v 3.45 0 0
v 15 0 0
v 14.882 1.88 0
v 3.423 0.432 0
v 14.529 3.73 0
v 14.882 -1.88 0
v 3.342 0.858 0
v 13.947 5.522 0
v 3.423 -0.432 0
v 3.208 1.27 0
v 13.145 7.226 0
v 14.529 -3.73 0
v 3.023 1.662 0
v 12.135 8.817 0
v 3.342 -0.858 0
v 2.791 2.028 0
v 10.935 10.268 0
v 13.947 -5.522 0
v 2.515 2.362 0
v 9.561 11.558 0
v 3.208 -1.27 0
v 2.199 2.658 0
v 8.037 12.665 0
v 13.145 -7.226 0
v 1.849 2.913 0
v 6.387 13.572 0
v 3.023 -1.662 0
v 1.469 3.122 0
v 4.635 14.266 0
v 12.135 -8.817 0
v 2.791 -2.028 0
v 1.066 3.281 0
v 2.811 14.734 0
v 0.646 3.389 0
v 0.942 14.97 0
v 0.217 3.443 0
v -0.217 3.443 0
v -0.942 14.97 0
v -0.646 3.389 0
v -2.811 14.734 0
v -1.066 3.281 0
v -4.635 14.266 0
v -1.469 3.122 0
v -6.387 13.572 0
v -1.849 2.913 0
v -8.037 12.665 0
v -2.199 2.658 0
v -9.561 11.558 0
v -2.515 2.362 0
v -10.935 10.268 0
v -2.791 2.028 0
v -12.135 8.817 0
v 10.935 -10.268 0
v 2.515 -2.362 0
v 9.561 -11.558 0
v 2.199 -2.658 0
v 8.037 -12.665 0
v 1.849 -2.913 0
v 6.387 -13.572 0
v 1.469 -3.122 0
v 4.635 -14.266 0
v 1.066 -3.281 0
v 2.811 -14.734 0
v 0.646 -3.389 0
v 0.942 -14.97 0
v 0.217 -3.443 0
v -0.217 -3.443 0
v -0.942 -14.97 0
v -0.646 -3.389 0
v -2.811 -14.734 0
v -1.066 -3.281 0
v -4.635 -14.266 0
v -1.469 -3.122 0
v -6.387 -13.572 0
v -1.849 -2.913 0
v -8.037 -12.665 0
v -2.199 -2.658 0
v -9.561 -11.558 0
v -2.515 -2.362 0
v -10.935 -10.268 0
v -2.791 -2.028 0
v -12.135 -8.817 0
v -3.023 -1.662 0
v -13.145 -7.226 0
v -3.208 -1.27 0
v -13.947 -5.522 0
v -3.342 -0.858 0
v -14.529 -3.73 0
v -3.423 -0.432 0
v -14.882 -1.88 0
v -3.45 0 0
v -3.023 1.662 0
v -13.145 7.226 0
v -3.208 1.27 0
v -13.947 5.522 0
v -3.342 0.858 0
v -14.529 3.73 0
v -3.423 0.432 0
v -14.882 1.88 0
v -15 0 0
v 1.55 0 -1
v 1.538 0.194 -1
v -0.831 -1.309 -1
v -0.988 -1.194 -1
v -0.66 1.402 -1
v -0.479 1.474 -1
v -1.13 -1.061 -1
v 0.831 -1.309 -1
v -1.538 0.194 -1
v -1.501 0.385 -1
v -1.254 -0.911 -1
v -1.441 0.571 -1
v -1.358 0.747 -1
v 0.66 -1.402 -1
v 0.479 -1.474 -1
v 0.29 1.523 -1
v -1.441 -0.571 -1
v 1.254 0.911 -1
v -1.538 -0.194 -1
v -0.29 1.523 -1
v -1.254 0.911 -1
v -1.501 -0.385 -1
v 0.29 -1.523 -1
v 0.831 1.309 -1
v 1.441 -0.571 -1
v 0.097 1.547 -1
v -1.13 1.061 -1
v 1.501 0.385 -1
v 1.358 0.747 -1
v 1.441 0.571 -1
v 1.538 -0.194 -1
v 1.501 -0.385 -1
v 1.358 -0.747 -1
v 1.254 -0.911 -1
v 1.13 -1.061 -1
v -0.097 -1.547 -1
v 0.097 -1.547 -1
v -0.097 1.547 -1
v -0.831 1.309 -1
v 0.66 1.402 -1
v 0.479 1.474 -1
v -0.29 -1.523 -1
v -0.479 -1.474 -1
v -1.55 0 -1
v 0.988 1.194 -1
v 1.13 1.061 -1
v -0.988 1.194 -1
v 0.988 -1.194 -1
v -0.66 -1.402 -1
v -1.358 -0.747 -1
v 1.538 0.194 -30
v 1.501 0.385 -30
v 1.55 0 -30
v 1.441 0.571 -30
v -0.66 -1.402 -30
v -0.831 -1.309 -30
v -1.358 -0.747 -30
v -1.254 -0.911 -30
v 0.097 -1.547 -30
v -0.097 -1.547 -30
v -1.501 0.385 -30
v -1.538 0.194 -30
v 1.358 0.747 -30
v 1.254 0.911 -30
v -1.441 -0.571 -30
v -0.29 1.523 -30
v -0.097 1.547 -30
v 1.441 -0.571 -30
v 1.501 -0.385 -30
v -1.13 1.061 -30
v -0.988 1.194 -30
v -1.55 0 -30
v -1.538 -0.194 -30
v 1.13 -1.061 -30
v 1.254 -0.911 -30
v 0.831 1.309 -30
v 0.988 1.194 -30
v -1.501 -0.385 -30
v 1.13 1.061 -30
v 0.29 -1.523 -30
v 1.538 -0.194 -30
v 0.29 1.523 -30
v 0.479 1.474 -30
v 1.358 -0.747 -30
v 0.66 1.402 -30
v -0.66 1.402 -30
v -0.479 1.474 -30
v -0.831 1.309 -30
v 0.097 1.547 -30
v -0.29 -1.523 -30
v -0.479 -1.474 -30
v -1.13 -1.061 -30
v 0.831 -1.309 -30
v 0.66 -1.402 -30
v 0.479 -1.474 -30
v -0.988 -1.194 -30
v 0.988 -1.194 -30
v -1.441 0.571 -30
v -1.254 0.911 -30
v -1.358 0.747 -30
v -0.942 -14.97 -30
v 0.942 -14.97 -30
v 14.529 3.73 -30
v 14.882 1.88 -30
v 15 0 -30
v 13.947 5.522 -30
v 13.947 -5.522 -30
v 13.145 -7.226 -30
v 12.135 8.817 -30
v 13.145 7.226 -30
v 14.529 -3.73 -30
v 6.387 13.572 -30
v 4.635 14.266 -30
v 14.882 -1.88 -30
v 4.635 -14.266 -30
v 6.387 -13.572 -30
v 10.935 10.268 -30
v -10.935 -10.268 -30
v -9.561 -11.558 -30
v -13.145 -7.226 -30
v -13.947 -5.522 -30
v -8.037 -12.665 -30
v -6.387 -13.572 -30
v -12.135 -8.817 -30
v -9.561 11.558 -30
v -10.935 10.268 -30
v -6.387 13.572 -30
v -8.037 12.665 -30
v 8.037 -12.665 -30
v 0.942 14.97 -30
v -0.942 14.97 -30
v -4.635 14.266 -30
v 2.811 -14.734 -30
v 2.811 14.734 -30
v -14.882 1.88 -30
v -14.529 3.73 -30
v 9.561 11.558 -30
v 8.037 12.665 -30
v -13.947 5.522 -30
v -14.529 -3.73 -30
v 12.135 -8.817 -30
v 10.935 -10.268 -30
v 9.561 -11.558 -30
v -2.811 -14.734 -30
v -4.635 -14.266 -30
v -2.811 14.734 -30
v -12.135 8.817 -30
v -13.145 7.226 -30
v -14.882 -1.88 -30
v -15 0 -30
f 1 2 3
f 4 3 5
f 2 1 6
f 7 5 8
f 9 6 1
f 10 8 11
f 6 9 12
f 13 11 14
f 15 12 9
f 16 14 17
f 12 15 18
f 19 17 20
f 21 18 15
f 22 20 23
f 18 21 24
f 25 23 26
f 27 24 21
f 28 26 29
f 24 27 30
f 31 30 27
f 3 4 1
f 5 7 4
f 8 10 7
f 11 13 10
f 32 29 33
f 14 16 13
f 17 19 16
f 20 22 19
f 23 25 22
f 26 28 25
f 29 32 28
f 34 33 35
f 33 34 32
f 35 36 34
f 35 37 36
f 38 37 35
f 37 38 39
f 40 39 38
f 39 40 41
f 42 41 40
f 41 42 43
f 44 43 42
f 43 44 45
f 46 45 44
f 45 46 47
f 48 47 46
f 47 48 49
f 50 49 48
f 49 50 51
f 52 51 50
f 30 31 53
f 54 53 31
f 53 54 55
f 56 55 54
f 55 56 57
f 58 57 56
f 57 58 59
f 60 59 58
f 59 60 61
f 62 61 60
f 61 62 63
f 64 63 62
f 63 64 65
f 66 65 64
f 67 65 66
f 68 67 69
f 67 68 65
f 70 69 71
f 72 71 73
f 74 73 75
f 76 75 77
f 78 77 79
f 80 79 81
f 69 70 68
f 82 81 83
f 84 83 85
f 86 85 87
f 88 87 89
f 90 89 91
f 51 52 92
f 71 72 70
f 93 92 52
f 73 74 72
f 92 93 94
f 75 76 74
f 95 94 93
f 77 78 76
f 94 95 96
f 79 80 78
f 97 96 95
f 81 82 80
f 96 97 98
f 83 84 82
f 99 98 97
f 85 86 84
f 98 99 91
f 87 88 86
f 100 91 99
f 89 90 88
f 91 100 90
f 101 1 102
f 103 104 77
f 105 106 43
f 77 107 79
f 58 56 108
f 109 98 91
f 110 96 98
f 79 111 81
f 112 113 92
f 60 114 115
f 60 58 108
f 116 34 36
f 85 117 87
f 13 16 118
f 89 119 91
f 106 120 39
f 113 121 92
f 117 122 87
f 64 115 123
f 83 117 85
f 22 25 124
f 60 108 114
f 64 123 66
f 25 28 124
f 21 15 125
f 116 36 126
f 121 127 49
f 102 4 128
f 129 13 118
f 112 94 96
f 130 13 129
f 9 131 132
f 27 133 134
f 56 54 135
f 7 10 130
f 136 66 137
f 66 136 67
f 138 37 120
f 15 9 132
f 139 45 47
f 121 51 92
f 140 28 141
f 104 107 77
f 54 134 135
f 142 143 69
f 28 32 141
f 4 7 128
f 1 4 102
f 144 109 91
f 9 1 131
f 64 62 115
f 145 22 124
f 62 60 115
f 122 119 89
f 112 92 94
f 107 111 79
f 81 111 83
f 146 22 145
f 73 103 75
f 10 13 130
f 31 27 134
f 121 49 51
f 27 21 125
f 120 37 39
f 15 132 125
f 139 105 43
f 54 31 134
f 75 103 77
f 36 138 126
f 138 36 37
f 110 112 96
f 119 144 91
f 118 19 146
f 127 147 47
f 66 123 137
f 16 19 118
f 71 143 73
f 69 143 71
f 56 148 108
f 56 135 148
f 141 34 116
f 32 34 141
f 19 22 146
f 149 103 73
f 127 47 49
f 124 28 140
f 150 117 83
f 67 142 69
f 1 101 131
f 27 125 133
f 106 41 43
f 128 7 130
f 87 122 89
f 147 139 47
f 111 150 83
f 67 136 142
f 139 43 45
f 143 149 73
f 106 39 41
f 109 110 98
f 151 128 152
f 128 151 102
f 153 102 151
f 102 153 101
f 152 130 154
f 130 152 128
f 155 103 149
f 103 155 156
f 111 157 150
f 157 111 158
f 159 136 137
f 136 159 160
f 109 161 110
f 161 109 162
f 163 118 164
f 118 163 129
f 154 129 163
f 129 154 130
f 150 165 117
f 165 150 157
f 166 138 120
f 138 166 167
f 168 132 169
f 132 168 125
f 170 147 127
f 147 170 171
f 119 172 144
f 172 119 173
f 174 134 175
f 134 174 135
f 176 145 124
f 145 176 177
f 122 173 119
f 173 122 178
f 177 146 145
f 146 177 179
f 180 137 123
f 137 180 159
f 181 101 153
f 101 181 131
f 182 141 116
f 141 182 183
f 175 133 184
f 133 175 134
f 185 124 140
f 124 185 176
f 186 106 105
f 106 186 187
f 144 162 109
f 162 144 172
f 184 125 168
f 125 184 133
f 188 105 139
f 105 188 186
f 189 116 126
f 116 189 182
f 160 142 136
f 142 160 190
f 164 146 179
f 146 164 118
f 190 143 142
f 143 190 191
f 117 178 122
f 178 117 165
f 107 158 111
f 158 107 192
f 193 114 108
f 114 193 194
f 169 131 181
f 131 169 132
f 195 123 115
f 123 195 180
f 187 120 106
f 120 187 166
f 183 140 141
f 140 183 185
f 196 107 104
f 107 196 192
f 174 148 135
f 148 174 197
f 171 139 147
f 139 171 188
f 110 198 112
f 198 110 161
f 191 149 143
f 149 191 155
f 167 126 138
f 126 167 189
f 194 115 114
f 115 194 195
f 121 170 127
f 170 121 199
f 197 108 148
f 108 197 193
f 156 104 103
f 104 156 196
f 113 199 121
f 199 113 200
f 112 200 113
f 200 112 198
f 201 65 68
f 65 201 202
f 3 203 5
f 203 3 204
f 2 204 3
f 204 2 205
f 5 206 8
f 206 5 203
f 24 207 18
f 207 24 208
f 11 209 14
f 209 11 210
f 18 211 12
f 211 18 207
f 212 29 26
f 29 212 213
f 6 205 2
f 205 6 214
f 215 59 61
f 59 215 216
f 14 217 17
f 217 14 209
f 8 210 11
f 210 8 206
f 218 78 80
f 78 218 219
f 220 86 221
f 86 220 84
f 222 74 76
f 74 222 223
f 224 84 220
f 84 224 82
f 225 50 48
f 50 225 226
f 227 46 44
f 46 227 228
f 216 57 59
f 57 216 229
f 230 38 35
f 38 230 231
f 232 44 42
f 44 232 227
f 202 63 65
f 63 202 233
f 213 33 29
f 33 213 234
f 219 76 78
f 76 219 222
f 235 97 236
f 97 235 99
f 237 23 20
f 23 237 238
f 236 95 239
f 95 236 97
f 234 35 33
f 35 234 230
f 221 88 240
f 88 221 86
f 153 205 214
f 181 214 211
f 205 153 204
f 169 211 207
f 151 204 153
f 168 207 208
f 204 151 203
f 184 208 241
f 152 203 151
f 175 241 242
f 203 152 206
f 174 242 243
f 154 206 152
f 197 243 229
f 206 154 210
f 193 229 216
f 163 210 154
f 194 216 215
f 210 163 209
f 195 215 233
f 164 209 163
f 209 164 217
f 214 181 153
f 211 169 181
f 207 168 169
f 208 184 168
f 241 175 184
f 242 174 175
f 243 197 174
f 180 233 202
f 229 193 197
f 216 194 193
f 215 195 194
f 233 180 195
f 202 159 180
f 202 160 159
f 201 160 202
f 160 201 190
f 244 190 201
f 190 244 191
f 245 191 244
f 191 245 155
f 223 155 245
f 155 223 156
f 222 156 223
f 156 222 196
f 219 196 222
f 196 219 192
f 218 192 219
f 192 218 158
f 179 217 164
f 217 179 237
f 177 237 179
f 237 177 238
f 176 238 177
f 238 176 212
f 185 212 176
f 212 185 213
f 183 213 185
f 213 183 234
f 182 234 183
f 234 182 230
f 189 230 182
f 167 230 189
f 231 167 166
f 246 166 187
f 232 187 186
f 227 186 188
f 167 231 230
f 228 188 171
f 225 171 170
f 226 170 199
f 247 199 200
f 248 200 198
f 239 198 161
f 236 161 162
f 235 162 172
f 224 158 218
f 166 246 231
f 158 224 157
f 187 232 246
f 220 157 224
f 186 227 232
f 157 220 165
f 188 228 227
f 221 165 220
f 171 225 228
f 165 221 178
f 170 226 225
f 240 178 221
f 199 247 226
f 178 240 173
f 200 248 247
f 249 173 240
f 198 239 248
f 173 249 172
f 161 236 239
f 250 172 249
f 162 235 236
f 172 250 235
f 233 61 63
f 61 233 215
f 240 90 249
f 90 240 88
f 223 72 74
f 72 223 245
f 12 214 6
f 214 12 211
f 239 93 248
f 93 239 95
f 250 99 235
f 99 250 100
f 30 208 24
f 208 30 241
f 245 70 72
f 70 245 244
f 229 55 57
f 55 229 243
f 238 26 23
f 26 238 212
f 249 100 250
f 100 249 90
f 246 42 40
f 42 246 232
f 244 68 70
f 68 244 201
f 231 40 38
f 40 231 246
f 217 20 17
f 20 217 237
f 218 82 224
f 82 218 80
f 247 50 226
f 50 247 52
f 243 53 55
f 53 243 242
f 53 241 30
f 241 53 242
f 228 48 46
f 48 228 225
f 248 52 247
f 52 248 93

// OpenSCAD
$fn = 50;

difference() {
	union() {
		translate(v = [0, 0, -30.0]) {
			cylinder(h = 30, r = 15.0);
		}
	}
	union() {
		translate(v = [0, 0, 0]) {
			rotate(a = [0, 0, 0]) {
				difference() {
					union() {
						translate(v = [0, 0, -33.0]) {
							cylinder(h = 33, r = 1.25);
						}
						translate(v = [0, 0, -1.0]) {
							cylinder(h = 1.0, r1 = 1.55, r2 = 3.45);
						}
						translate(v = [0, 0, -33.0]) {
							cylinder(h = 33, r = 1.55);
						}
						translate(v = [0, 0, -33.0]) {
							cylinder(h = 33, r = 1.25);
						}
					}
					union();
				}
			}
		}
	}
}
